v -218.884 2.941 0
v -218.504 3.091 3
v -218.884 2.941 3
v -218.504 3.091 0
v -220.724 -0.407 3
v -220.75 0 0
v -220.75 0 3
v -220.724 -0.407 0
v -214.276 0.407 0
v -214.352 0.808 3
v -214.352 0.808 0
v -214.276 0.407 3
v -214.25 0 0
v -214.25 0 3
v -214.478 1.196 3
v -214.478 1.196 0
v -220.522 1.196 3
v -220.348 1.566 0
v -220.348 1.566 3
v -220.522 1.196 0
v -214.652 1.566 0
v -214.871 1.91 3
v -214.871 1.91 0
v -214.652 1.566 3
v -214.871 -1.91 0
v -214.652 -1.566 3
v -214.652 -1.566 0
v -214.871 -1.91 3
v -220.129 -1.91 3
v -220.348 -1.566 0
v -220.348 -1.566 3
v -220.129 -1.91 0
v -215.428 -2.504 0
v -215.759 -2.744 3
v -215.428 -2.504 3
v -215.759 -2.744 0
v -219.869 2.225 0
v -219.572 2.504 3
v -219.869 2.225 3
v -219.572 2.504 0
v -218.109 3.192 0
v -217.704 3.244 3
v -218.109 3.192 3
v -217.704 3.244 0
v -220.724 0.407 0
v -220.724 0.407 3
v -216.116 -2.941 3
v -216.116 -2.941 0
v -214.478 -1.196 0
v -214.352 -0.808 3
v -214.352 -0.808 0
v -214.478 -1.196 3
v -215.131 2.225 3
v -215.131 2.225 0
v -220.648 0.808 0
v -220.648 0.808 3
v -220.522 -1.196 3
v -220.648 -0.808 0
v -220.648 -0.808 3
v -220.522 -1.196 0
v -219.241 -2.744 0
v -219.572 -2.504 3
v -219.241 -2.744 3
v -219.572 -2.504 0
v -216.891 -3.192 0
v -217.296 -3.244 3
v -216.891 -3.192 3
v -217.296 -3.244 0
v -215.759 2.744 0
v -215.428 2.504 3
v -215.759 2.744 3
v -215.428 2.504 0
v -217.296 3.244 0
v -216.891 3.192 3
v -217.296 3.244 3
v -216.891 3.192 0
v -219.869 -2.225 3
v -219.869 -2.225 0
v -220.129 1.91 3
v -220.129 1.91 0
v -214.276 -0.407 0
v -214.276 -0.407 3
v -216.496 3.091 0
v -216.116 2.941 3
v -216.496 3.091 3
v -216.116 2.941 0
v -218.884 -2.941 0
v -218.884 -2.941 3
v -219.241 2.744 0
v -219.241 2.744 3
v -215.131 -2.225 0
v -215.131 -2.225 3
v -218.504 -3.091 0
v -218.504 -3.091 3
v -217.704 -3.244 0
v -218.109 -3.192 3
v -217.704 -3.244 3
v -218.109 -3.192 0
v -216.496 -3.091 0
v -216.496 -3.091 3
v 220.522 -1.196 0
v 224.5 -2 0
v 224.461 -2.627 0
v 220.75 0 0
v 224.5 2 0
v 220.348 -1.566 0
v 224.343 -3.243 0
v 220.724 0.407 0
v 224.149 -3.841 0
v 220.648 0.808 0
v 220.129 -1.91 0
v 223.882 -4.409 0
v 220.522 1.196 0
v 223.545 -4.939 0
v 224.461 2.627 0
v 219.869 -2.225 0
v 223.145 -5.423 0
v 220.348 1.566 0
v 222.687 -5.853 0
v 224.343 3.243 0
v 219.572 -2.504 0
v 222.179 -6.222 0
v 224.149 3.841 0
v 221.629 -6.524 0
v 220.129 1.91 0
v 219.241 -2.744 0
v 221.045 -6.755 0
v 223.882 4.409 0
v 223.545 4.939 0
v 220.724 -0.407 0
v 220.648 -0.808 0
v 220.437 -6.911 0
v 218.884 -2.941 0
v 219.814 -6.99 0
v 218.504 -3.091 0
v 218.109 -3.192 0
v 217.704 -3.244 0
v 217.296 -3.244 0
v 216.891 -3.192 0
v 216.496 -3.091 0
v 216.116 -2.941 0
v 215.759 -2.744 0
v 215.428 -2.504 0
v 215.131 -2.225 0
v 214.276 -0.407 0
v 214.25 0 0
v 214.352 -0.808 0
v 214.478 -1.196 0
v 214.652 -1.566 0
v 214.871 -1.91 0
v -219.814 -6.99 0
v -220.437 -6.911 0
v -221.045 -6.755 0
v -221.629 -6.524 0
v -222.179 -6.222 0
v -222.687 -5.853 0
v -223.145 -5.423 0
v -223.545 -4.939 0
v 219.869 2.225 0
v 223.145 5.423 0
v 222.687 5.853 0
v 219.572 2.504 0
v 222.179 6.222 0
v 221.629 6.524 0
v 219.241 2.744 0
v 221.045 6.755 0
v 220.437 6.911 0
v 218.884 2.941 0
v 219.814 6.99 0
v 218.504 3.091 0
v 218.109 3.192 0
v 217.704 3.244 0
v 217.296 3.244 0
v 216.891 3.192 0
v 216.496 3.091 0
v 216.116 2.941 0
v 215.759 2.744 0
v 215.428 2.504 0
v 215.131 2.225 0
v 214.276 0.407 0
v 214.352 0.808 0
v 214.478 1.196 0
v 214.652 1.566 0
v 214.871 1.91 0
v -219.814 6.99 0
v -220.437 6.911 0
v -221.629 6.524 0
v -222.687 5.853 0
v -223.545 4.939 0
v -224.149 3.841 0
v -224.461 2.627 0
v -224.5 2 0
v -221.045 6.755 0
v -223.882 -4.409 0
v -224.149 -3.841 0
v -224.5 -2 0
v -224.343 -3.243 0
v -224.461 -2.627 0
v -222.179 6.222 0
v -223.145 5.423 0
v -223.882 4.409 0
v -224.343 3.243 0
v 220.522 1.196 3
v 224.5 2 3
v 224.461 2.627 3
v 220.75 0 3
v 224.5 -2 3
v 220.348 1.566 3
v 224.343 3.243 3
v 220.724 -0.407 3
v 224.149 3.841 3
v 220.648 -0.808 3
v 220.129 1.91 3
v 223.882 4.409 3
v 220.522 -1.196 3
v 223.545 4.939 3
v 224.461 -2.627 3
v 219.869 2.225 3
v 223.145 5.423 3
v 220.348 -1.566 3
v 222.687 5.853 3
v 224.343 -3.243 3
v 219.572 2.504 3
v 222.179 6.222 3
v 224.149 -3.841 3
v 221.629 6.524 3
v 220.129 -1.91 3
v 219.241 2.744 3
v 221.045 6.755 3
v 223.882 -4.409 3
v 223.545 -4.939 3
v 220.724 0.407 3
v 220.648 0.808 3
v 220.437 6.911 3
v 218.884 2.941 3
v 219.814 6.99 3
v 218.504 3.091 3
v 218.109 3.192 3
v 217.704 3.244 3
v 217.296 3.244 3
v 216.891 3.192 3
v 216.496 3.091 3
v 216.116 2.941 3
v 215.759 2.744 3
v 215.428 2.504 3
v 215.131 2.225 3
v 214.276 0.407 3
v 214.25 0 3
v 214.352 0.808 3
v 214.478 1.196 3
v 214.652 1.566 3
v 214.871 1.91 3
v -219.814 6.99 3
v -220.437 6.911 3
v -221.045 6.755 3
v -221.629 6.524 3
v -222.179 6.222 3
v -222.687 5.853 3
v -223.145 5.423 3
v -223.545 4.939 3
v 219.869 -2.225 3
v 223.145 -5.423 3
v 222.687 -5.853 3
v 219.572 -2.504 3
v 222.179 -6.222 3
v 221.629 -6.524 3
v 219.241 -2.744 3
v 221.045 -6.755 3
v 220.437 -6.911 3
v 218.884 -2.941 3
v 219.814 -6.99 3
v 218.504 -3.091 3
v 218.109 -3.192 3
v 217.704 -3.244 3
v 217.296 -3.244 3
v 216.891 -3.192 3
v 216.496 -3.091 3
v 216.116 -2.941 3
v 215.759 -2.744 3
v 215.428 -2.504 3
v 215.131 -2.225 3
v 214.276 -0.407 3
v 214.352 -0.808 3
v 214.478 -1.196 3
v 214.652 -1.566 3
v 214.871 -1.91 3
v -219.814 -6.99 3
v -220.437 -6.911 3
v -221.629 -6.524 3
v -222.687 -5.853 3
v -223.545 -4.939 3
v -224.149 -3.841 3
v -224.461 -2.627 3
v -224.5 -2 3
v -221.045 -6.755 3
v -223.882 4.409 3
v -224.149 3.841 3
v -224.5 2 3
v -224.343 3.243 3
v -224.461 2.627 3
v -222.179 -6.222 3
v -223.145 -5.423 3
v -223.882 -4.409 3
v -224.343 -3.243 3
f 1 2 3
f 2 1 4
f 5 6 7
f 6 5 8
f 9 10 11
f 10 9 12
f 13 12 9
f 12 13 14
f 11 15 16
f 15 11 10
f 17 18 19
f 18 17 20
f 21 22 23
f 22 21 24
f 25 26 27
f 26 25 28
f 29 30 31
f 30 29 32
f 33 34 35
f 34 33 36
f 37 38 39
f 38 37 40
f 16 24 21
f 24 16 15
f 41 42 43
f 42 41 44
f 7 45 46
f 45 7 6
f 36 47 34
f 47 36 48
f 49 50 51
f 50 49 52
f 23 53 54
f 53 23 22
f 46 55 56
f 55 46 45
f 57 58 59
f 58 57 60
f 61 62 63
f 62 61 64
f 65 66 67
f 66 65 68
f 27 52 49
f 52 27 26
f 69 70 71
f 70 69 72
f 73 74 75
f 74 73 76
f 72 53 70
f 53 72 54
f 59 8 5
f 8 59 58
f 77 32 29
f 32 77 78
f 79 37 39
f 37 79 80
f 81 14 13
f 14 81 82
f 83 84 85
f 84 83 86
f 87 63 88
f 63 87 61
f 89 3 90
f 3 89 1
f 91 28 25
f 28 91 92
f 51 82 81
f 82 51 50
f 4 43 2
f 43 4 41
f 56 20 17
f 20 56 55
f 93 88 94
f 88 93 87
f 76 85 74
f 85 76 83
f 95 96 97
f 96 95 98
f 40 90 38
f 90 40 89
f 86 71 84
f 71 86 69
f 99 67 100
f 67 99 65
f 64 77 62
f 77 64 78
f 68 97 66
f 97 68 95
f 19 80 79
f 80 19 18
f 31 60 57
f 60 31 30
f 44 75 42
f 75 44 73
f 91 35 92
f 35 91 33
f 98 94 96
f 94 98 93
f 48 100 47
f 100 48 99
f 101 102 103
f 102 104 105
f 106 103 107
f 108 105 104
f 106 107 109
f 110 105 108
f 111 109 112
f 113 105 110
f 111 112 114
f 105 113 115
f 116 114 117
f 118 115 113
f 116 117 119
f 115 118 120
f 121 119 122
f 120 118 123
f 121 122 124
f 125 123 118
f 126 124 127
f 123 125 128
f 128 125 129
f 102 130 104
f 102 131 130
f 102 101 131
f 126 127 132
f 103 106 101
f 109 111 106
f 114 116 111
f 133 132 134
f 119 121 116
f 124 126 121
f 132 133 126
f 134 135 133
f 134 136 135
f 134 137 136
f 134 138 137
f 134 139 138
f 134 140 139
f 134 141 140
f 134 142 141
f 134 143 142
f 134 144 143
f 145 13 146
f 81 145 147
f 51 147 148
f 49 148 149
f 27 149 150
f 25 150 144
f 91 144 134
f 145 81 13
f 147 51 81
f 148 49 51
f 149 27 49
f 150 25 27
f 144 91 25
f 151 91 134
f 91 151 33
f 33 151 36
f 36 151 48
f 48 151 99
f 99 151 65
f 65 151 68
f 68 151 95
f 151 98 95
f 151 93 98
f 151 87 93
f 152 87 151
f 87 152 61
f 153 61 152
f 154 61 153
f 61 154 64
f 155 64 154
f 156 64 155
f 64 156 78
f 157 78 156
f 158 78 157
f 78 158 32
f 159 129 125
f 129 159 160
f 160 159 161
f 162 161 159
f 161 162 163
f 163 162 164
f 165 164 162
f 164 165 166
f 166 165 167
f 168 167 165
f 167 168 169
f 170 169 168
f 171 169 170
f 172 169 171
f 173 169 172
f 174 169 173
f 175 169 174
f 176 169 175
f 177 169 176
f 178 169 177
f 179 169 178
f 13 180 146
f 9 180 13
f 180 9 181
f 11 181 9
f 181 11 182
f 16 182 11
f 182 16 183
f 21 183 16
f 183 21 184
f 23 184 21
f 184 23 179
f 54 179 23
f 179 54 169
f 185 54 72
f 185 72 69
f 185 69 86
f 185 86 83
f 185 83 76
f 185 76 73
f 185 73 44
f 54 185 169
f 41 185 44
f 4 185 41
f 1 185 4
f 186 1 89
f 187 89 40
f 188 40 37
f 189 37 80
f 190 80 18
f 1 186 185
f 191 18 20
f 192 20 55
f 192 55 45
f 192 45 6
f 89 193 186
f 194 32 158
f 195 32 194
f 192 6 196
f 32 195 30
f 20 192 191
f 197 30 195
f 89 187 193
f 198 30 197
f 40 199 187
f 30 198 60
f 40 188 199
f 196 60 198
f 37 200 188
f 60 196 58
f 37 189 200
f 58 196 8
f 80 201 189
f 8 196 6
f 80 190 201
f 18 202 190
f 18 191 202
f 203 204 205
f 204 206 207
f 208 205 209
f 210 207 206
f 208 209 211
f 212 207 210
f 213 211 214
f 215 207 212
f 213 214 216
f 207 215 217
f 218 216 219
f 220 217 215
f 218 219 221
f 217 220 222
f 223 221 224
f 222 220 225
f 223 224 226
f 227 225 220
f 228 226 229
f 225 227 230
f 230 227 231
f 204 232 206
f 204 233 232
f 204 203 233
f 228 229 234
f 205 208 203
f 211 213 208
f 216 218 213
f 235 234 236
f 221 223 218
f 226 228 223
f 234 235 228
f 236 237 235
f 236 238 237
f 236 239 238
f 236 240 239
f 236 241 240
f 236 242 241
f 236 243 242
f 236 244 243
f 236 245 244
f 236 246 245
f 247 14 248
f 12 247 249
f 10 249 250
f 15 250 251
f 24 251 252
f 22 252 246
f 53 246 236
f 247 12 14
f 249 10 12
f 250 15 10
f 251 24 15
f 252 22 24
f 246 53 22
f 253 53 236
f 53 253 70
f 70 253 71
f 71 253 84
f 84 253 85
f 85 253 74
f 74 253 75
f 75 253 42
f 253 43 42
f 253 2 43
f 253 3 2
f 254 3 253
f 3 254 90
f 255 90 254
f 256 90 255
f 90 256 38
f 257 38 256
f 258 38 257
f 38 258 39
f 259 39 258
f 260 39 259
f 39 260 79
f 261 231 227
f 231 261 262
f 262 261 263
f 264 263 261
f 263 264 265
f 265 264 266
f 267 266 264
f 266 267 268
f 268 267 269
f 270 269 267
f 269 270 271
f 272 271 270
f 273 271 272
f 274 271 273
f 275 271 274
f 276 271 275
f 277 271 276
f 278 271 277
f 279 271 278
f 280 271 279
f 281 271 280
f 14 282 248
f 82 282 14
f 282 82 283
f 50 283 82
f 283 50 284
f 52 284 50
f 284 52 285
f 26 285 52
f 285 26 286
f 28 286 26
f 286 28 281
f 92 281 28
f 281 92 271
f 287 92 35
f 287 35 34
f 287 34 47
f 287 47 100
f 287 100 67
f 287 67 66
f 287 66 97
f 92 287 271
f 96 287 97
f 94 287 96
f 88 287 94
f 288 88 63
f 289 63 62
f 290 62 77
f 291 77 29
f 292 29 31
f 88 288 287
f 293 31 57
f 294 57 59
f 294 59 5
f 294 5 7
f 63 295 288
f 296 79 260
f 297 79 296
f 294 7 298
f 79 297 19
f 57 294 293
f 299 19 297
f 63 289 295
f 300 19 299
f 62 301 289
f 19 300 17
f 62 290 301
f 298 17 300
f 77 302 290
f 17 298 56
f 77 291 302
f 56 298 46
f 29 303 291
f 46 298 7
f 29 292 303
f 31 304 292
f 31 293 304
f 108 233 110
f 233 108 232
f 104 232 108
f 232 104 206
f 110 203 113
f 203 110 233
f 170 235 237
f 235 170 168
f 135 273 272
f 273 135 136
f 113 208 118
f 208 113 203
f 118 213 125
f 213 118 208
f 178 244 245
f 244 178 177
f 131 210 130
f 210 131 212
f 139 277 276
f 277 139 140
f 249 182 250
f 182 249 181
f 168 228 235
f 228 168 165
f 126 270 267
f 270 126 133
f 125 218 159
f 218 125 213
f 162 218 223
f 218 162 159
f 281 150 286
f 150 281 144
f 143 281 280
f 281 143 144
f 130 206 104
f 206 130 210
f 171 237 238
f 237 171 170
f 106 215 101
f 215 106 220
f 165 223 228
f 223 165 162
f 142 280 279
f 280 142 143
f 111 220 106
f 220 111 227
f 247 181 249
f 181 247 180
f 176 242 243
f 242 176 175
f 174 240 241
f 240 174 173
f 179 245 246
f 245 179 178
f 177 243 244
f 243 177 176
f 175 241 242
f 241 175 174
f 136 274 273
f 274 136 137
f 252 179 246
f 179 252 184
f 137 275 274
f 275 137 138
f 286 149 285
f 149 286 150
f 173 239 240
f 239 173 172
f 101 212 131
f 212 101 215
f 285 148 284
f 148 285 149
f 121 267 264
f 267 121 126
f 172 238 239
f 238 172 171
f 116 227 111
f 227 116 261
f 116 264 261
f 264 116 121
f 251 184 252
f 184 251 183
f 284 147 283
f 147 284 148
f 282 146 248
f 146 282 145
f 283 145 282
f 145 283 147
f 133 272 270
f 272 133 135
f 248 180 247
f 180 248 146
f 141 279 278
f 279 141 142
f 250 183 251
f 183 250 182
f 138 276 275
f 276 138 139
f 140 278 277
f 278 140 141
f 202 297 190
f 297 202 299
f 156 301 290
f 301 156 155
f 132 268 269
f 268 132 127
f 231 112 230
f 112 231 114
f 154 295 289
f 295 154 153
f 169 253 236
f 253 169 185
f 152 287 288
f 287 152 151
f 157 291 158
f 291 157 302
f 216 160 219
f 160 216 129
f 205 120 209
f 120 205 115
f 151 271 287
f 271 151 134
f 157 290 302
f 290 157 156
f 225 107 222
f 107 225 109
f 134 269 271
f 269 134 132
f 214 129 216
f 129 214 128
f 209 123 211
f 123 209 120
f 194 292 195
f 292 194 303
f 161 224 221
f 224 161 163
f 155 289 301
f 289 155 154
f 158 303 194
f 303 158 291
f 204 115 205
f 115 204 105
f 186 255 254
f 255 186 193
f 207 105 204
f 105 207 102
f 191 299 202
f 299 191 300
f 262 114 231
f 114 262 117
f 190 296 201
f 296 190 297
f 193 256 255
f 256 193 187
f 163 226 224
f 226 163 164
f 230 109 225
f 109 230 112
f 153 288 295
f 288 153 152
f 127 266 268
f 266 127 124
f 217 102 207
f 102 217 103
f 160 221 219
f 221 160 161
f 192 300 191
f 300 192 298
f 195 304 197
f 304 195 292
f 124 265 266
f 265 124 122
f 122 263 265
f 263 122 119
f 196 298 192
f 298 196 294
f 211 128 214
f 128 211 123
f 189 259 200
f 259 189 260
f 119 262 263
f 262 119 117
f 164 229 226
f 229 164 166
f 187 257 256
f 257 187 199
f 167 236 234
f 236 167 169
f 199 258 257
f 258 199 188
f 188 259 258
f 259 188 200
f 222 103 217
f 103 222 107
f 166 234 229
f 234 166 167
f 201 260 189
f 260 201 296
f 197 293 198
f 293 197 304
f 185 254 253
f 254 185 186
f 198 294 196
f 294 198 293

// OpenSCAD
$fn = 50;


difference() {
	union() {
		hull() {
			translate(v = [-219.5000000000, 2.0000000000, 0]) {
				cylinder(h = 3, r = 5);
			}
			translate(v = [219.5000000000, 2.0000000000, 0]) {
				cylinder(h = 3, r = 5);
			}
			translate(v = [-219.5000000000, -2.0000000000, 0]) {
				cylinder(h = 3, r = 5);
			}
			translate(v = [219.5000000000, -2.0000000000, 0]) {
				cylinder(h = 3, r = 5);
			}
		}
	}
	union() {
		translate(v = [-217.5000000000, 0.0000000000, 0]) {
			cylinder(h = 3, r = 3.2500000000);
		}
		translate(v = [217.5000000000, 0.0000000000, 0]) {
			cylinder(h = 3, r = 3.2500000000);
		}
		translate(v = [-217.5000000000, 0.0000000000, 0]) {
			cylinder(h = 3, r = 1.8000000000);
		}
		translate(v = [217.5000000000, 0.0000000000, 0]) {
			cylinder(h = 3, r = 1.8000000000);
		}
		translate(v = [-217.5000000000, 0.0000000000, 0]) {
			cylinder(h = 3, r = 1.8000000000);
		}
		translate(v = [217.5000000000, 0.0000000000, 0]) {
			cylinder(h = 3, r = 1.8000000000);
		}
		translate(v = [-217.5000000000, 0.0000000000, 0]) {
			cylinder(h = 3, r = 1.8000000000);
		}
		translate(v = [217.5000000000, 0.0000000000, 0]) {
			cylinder(h = 3, r = 1.8000000000);
		}
	}
}
